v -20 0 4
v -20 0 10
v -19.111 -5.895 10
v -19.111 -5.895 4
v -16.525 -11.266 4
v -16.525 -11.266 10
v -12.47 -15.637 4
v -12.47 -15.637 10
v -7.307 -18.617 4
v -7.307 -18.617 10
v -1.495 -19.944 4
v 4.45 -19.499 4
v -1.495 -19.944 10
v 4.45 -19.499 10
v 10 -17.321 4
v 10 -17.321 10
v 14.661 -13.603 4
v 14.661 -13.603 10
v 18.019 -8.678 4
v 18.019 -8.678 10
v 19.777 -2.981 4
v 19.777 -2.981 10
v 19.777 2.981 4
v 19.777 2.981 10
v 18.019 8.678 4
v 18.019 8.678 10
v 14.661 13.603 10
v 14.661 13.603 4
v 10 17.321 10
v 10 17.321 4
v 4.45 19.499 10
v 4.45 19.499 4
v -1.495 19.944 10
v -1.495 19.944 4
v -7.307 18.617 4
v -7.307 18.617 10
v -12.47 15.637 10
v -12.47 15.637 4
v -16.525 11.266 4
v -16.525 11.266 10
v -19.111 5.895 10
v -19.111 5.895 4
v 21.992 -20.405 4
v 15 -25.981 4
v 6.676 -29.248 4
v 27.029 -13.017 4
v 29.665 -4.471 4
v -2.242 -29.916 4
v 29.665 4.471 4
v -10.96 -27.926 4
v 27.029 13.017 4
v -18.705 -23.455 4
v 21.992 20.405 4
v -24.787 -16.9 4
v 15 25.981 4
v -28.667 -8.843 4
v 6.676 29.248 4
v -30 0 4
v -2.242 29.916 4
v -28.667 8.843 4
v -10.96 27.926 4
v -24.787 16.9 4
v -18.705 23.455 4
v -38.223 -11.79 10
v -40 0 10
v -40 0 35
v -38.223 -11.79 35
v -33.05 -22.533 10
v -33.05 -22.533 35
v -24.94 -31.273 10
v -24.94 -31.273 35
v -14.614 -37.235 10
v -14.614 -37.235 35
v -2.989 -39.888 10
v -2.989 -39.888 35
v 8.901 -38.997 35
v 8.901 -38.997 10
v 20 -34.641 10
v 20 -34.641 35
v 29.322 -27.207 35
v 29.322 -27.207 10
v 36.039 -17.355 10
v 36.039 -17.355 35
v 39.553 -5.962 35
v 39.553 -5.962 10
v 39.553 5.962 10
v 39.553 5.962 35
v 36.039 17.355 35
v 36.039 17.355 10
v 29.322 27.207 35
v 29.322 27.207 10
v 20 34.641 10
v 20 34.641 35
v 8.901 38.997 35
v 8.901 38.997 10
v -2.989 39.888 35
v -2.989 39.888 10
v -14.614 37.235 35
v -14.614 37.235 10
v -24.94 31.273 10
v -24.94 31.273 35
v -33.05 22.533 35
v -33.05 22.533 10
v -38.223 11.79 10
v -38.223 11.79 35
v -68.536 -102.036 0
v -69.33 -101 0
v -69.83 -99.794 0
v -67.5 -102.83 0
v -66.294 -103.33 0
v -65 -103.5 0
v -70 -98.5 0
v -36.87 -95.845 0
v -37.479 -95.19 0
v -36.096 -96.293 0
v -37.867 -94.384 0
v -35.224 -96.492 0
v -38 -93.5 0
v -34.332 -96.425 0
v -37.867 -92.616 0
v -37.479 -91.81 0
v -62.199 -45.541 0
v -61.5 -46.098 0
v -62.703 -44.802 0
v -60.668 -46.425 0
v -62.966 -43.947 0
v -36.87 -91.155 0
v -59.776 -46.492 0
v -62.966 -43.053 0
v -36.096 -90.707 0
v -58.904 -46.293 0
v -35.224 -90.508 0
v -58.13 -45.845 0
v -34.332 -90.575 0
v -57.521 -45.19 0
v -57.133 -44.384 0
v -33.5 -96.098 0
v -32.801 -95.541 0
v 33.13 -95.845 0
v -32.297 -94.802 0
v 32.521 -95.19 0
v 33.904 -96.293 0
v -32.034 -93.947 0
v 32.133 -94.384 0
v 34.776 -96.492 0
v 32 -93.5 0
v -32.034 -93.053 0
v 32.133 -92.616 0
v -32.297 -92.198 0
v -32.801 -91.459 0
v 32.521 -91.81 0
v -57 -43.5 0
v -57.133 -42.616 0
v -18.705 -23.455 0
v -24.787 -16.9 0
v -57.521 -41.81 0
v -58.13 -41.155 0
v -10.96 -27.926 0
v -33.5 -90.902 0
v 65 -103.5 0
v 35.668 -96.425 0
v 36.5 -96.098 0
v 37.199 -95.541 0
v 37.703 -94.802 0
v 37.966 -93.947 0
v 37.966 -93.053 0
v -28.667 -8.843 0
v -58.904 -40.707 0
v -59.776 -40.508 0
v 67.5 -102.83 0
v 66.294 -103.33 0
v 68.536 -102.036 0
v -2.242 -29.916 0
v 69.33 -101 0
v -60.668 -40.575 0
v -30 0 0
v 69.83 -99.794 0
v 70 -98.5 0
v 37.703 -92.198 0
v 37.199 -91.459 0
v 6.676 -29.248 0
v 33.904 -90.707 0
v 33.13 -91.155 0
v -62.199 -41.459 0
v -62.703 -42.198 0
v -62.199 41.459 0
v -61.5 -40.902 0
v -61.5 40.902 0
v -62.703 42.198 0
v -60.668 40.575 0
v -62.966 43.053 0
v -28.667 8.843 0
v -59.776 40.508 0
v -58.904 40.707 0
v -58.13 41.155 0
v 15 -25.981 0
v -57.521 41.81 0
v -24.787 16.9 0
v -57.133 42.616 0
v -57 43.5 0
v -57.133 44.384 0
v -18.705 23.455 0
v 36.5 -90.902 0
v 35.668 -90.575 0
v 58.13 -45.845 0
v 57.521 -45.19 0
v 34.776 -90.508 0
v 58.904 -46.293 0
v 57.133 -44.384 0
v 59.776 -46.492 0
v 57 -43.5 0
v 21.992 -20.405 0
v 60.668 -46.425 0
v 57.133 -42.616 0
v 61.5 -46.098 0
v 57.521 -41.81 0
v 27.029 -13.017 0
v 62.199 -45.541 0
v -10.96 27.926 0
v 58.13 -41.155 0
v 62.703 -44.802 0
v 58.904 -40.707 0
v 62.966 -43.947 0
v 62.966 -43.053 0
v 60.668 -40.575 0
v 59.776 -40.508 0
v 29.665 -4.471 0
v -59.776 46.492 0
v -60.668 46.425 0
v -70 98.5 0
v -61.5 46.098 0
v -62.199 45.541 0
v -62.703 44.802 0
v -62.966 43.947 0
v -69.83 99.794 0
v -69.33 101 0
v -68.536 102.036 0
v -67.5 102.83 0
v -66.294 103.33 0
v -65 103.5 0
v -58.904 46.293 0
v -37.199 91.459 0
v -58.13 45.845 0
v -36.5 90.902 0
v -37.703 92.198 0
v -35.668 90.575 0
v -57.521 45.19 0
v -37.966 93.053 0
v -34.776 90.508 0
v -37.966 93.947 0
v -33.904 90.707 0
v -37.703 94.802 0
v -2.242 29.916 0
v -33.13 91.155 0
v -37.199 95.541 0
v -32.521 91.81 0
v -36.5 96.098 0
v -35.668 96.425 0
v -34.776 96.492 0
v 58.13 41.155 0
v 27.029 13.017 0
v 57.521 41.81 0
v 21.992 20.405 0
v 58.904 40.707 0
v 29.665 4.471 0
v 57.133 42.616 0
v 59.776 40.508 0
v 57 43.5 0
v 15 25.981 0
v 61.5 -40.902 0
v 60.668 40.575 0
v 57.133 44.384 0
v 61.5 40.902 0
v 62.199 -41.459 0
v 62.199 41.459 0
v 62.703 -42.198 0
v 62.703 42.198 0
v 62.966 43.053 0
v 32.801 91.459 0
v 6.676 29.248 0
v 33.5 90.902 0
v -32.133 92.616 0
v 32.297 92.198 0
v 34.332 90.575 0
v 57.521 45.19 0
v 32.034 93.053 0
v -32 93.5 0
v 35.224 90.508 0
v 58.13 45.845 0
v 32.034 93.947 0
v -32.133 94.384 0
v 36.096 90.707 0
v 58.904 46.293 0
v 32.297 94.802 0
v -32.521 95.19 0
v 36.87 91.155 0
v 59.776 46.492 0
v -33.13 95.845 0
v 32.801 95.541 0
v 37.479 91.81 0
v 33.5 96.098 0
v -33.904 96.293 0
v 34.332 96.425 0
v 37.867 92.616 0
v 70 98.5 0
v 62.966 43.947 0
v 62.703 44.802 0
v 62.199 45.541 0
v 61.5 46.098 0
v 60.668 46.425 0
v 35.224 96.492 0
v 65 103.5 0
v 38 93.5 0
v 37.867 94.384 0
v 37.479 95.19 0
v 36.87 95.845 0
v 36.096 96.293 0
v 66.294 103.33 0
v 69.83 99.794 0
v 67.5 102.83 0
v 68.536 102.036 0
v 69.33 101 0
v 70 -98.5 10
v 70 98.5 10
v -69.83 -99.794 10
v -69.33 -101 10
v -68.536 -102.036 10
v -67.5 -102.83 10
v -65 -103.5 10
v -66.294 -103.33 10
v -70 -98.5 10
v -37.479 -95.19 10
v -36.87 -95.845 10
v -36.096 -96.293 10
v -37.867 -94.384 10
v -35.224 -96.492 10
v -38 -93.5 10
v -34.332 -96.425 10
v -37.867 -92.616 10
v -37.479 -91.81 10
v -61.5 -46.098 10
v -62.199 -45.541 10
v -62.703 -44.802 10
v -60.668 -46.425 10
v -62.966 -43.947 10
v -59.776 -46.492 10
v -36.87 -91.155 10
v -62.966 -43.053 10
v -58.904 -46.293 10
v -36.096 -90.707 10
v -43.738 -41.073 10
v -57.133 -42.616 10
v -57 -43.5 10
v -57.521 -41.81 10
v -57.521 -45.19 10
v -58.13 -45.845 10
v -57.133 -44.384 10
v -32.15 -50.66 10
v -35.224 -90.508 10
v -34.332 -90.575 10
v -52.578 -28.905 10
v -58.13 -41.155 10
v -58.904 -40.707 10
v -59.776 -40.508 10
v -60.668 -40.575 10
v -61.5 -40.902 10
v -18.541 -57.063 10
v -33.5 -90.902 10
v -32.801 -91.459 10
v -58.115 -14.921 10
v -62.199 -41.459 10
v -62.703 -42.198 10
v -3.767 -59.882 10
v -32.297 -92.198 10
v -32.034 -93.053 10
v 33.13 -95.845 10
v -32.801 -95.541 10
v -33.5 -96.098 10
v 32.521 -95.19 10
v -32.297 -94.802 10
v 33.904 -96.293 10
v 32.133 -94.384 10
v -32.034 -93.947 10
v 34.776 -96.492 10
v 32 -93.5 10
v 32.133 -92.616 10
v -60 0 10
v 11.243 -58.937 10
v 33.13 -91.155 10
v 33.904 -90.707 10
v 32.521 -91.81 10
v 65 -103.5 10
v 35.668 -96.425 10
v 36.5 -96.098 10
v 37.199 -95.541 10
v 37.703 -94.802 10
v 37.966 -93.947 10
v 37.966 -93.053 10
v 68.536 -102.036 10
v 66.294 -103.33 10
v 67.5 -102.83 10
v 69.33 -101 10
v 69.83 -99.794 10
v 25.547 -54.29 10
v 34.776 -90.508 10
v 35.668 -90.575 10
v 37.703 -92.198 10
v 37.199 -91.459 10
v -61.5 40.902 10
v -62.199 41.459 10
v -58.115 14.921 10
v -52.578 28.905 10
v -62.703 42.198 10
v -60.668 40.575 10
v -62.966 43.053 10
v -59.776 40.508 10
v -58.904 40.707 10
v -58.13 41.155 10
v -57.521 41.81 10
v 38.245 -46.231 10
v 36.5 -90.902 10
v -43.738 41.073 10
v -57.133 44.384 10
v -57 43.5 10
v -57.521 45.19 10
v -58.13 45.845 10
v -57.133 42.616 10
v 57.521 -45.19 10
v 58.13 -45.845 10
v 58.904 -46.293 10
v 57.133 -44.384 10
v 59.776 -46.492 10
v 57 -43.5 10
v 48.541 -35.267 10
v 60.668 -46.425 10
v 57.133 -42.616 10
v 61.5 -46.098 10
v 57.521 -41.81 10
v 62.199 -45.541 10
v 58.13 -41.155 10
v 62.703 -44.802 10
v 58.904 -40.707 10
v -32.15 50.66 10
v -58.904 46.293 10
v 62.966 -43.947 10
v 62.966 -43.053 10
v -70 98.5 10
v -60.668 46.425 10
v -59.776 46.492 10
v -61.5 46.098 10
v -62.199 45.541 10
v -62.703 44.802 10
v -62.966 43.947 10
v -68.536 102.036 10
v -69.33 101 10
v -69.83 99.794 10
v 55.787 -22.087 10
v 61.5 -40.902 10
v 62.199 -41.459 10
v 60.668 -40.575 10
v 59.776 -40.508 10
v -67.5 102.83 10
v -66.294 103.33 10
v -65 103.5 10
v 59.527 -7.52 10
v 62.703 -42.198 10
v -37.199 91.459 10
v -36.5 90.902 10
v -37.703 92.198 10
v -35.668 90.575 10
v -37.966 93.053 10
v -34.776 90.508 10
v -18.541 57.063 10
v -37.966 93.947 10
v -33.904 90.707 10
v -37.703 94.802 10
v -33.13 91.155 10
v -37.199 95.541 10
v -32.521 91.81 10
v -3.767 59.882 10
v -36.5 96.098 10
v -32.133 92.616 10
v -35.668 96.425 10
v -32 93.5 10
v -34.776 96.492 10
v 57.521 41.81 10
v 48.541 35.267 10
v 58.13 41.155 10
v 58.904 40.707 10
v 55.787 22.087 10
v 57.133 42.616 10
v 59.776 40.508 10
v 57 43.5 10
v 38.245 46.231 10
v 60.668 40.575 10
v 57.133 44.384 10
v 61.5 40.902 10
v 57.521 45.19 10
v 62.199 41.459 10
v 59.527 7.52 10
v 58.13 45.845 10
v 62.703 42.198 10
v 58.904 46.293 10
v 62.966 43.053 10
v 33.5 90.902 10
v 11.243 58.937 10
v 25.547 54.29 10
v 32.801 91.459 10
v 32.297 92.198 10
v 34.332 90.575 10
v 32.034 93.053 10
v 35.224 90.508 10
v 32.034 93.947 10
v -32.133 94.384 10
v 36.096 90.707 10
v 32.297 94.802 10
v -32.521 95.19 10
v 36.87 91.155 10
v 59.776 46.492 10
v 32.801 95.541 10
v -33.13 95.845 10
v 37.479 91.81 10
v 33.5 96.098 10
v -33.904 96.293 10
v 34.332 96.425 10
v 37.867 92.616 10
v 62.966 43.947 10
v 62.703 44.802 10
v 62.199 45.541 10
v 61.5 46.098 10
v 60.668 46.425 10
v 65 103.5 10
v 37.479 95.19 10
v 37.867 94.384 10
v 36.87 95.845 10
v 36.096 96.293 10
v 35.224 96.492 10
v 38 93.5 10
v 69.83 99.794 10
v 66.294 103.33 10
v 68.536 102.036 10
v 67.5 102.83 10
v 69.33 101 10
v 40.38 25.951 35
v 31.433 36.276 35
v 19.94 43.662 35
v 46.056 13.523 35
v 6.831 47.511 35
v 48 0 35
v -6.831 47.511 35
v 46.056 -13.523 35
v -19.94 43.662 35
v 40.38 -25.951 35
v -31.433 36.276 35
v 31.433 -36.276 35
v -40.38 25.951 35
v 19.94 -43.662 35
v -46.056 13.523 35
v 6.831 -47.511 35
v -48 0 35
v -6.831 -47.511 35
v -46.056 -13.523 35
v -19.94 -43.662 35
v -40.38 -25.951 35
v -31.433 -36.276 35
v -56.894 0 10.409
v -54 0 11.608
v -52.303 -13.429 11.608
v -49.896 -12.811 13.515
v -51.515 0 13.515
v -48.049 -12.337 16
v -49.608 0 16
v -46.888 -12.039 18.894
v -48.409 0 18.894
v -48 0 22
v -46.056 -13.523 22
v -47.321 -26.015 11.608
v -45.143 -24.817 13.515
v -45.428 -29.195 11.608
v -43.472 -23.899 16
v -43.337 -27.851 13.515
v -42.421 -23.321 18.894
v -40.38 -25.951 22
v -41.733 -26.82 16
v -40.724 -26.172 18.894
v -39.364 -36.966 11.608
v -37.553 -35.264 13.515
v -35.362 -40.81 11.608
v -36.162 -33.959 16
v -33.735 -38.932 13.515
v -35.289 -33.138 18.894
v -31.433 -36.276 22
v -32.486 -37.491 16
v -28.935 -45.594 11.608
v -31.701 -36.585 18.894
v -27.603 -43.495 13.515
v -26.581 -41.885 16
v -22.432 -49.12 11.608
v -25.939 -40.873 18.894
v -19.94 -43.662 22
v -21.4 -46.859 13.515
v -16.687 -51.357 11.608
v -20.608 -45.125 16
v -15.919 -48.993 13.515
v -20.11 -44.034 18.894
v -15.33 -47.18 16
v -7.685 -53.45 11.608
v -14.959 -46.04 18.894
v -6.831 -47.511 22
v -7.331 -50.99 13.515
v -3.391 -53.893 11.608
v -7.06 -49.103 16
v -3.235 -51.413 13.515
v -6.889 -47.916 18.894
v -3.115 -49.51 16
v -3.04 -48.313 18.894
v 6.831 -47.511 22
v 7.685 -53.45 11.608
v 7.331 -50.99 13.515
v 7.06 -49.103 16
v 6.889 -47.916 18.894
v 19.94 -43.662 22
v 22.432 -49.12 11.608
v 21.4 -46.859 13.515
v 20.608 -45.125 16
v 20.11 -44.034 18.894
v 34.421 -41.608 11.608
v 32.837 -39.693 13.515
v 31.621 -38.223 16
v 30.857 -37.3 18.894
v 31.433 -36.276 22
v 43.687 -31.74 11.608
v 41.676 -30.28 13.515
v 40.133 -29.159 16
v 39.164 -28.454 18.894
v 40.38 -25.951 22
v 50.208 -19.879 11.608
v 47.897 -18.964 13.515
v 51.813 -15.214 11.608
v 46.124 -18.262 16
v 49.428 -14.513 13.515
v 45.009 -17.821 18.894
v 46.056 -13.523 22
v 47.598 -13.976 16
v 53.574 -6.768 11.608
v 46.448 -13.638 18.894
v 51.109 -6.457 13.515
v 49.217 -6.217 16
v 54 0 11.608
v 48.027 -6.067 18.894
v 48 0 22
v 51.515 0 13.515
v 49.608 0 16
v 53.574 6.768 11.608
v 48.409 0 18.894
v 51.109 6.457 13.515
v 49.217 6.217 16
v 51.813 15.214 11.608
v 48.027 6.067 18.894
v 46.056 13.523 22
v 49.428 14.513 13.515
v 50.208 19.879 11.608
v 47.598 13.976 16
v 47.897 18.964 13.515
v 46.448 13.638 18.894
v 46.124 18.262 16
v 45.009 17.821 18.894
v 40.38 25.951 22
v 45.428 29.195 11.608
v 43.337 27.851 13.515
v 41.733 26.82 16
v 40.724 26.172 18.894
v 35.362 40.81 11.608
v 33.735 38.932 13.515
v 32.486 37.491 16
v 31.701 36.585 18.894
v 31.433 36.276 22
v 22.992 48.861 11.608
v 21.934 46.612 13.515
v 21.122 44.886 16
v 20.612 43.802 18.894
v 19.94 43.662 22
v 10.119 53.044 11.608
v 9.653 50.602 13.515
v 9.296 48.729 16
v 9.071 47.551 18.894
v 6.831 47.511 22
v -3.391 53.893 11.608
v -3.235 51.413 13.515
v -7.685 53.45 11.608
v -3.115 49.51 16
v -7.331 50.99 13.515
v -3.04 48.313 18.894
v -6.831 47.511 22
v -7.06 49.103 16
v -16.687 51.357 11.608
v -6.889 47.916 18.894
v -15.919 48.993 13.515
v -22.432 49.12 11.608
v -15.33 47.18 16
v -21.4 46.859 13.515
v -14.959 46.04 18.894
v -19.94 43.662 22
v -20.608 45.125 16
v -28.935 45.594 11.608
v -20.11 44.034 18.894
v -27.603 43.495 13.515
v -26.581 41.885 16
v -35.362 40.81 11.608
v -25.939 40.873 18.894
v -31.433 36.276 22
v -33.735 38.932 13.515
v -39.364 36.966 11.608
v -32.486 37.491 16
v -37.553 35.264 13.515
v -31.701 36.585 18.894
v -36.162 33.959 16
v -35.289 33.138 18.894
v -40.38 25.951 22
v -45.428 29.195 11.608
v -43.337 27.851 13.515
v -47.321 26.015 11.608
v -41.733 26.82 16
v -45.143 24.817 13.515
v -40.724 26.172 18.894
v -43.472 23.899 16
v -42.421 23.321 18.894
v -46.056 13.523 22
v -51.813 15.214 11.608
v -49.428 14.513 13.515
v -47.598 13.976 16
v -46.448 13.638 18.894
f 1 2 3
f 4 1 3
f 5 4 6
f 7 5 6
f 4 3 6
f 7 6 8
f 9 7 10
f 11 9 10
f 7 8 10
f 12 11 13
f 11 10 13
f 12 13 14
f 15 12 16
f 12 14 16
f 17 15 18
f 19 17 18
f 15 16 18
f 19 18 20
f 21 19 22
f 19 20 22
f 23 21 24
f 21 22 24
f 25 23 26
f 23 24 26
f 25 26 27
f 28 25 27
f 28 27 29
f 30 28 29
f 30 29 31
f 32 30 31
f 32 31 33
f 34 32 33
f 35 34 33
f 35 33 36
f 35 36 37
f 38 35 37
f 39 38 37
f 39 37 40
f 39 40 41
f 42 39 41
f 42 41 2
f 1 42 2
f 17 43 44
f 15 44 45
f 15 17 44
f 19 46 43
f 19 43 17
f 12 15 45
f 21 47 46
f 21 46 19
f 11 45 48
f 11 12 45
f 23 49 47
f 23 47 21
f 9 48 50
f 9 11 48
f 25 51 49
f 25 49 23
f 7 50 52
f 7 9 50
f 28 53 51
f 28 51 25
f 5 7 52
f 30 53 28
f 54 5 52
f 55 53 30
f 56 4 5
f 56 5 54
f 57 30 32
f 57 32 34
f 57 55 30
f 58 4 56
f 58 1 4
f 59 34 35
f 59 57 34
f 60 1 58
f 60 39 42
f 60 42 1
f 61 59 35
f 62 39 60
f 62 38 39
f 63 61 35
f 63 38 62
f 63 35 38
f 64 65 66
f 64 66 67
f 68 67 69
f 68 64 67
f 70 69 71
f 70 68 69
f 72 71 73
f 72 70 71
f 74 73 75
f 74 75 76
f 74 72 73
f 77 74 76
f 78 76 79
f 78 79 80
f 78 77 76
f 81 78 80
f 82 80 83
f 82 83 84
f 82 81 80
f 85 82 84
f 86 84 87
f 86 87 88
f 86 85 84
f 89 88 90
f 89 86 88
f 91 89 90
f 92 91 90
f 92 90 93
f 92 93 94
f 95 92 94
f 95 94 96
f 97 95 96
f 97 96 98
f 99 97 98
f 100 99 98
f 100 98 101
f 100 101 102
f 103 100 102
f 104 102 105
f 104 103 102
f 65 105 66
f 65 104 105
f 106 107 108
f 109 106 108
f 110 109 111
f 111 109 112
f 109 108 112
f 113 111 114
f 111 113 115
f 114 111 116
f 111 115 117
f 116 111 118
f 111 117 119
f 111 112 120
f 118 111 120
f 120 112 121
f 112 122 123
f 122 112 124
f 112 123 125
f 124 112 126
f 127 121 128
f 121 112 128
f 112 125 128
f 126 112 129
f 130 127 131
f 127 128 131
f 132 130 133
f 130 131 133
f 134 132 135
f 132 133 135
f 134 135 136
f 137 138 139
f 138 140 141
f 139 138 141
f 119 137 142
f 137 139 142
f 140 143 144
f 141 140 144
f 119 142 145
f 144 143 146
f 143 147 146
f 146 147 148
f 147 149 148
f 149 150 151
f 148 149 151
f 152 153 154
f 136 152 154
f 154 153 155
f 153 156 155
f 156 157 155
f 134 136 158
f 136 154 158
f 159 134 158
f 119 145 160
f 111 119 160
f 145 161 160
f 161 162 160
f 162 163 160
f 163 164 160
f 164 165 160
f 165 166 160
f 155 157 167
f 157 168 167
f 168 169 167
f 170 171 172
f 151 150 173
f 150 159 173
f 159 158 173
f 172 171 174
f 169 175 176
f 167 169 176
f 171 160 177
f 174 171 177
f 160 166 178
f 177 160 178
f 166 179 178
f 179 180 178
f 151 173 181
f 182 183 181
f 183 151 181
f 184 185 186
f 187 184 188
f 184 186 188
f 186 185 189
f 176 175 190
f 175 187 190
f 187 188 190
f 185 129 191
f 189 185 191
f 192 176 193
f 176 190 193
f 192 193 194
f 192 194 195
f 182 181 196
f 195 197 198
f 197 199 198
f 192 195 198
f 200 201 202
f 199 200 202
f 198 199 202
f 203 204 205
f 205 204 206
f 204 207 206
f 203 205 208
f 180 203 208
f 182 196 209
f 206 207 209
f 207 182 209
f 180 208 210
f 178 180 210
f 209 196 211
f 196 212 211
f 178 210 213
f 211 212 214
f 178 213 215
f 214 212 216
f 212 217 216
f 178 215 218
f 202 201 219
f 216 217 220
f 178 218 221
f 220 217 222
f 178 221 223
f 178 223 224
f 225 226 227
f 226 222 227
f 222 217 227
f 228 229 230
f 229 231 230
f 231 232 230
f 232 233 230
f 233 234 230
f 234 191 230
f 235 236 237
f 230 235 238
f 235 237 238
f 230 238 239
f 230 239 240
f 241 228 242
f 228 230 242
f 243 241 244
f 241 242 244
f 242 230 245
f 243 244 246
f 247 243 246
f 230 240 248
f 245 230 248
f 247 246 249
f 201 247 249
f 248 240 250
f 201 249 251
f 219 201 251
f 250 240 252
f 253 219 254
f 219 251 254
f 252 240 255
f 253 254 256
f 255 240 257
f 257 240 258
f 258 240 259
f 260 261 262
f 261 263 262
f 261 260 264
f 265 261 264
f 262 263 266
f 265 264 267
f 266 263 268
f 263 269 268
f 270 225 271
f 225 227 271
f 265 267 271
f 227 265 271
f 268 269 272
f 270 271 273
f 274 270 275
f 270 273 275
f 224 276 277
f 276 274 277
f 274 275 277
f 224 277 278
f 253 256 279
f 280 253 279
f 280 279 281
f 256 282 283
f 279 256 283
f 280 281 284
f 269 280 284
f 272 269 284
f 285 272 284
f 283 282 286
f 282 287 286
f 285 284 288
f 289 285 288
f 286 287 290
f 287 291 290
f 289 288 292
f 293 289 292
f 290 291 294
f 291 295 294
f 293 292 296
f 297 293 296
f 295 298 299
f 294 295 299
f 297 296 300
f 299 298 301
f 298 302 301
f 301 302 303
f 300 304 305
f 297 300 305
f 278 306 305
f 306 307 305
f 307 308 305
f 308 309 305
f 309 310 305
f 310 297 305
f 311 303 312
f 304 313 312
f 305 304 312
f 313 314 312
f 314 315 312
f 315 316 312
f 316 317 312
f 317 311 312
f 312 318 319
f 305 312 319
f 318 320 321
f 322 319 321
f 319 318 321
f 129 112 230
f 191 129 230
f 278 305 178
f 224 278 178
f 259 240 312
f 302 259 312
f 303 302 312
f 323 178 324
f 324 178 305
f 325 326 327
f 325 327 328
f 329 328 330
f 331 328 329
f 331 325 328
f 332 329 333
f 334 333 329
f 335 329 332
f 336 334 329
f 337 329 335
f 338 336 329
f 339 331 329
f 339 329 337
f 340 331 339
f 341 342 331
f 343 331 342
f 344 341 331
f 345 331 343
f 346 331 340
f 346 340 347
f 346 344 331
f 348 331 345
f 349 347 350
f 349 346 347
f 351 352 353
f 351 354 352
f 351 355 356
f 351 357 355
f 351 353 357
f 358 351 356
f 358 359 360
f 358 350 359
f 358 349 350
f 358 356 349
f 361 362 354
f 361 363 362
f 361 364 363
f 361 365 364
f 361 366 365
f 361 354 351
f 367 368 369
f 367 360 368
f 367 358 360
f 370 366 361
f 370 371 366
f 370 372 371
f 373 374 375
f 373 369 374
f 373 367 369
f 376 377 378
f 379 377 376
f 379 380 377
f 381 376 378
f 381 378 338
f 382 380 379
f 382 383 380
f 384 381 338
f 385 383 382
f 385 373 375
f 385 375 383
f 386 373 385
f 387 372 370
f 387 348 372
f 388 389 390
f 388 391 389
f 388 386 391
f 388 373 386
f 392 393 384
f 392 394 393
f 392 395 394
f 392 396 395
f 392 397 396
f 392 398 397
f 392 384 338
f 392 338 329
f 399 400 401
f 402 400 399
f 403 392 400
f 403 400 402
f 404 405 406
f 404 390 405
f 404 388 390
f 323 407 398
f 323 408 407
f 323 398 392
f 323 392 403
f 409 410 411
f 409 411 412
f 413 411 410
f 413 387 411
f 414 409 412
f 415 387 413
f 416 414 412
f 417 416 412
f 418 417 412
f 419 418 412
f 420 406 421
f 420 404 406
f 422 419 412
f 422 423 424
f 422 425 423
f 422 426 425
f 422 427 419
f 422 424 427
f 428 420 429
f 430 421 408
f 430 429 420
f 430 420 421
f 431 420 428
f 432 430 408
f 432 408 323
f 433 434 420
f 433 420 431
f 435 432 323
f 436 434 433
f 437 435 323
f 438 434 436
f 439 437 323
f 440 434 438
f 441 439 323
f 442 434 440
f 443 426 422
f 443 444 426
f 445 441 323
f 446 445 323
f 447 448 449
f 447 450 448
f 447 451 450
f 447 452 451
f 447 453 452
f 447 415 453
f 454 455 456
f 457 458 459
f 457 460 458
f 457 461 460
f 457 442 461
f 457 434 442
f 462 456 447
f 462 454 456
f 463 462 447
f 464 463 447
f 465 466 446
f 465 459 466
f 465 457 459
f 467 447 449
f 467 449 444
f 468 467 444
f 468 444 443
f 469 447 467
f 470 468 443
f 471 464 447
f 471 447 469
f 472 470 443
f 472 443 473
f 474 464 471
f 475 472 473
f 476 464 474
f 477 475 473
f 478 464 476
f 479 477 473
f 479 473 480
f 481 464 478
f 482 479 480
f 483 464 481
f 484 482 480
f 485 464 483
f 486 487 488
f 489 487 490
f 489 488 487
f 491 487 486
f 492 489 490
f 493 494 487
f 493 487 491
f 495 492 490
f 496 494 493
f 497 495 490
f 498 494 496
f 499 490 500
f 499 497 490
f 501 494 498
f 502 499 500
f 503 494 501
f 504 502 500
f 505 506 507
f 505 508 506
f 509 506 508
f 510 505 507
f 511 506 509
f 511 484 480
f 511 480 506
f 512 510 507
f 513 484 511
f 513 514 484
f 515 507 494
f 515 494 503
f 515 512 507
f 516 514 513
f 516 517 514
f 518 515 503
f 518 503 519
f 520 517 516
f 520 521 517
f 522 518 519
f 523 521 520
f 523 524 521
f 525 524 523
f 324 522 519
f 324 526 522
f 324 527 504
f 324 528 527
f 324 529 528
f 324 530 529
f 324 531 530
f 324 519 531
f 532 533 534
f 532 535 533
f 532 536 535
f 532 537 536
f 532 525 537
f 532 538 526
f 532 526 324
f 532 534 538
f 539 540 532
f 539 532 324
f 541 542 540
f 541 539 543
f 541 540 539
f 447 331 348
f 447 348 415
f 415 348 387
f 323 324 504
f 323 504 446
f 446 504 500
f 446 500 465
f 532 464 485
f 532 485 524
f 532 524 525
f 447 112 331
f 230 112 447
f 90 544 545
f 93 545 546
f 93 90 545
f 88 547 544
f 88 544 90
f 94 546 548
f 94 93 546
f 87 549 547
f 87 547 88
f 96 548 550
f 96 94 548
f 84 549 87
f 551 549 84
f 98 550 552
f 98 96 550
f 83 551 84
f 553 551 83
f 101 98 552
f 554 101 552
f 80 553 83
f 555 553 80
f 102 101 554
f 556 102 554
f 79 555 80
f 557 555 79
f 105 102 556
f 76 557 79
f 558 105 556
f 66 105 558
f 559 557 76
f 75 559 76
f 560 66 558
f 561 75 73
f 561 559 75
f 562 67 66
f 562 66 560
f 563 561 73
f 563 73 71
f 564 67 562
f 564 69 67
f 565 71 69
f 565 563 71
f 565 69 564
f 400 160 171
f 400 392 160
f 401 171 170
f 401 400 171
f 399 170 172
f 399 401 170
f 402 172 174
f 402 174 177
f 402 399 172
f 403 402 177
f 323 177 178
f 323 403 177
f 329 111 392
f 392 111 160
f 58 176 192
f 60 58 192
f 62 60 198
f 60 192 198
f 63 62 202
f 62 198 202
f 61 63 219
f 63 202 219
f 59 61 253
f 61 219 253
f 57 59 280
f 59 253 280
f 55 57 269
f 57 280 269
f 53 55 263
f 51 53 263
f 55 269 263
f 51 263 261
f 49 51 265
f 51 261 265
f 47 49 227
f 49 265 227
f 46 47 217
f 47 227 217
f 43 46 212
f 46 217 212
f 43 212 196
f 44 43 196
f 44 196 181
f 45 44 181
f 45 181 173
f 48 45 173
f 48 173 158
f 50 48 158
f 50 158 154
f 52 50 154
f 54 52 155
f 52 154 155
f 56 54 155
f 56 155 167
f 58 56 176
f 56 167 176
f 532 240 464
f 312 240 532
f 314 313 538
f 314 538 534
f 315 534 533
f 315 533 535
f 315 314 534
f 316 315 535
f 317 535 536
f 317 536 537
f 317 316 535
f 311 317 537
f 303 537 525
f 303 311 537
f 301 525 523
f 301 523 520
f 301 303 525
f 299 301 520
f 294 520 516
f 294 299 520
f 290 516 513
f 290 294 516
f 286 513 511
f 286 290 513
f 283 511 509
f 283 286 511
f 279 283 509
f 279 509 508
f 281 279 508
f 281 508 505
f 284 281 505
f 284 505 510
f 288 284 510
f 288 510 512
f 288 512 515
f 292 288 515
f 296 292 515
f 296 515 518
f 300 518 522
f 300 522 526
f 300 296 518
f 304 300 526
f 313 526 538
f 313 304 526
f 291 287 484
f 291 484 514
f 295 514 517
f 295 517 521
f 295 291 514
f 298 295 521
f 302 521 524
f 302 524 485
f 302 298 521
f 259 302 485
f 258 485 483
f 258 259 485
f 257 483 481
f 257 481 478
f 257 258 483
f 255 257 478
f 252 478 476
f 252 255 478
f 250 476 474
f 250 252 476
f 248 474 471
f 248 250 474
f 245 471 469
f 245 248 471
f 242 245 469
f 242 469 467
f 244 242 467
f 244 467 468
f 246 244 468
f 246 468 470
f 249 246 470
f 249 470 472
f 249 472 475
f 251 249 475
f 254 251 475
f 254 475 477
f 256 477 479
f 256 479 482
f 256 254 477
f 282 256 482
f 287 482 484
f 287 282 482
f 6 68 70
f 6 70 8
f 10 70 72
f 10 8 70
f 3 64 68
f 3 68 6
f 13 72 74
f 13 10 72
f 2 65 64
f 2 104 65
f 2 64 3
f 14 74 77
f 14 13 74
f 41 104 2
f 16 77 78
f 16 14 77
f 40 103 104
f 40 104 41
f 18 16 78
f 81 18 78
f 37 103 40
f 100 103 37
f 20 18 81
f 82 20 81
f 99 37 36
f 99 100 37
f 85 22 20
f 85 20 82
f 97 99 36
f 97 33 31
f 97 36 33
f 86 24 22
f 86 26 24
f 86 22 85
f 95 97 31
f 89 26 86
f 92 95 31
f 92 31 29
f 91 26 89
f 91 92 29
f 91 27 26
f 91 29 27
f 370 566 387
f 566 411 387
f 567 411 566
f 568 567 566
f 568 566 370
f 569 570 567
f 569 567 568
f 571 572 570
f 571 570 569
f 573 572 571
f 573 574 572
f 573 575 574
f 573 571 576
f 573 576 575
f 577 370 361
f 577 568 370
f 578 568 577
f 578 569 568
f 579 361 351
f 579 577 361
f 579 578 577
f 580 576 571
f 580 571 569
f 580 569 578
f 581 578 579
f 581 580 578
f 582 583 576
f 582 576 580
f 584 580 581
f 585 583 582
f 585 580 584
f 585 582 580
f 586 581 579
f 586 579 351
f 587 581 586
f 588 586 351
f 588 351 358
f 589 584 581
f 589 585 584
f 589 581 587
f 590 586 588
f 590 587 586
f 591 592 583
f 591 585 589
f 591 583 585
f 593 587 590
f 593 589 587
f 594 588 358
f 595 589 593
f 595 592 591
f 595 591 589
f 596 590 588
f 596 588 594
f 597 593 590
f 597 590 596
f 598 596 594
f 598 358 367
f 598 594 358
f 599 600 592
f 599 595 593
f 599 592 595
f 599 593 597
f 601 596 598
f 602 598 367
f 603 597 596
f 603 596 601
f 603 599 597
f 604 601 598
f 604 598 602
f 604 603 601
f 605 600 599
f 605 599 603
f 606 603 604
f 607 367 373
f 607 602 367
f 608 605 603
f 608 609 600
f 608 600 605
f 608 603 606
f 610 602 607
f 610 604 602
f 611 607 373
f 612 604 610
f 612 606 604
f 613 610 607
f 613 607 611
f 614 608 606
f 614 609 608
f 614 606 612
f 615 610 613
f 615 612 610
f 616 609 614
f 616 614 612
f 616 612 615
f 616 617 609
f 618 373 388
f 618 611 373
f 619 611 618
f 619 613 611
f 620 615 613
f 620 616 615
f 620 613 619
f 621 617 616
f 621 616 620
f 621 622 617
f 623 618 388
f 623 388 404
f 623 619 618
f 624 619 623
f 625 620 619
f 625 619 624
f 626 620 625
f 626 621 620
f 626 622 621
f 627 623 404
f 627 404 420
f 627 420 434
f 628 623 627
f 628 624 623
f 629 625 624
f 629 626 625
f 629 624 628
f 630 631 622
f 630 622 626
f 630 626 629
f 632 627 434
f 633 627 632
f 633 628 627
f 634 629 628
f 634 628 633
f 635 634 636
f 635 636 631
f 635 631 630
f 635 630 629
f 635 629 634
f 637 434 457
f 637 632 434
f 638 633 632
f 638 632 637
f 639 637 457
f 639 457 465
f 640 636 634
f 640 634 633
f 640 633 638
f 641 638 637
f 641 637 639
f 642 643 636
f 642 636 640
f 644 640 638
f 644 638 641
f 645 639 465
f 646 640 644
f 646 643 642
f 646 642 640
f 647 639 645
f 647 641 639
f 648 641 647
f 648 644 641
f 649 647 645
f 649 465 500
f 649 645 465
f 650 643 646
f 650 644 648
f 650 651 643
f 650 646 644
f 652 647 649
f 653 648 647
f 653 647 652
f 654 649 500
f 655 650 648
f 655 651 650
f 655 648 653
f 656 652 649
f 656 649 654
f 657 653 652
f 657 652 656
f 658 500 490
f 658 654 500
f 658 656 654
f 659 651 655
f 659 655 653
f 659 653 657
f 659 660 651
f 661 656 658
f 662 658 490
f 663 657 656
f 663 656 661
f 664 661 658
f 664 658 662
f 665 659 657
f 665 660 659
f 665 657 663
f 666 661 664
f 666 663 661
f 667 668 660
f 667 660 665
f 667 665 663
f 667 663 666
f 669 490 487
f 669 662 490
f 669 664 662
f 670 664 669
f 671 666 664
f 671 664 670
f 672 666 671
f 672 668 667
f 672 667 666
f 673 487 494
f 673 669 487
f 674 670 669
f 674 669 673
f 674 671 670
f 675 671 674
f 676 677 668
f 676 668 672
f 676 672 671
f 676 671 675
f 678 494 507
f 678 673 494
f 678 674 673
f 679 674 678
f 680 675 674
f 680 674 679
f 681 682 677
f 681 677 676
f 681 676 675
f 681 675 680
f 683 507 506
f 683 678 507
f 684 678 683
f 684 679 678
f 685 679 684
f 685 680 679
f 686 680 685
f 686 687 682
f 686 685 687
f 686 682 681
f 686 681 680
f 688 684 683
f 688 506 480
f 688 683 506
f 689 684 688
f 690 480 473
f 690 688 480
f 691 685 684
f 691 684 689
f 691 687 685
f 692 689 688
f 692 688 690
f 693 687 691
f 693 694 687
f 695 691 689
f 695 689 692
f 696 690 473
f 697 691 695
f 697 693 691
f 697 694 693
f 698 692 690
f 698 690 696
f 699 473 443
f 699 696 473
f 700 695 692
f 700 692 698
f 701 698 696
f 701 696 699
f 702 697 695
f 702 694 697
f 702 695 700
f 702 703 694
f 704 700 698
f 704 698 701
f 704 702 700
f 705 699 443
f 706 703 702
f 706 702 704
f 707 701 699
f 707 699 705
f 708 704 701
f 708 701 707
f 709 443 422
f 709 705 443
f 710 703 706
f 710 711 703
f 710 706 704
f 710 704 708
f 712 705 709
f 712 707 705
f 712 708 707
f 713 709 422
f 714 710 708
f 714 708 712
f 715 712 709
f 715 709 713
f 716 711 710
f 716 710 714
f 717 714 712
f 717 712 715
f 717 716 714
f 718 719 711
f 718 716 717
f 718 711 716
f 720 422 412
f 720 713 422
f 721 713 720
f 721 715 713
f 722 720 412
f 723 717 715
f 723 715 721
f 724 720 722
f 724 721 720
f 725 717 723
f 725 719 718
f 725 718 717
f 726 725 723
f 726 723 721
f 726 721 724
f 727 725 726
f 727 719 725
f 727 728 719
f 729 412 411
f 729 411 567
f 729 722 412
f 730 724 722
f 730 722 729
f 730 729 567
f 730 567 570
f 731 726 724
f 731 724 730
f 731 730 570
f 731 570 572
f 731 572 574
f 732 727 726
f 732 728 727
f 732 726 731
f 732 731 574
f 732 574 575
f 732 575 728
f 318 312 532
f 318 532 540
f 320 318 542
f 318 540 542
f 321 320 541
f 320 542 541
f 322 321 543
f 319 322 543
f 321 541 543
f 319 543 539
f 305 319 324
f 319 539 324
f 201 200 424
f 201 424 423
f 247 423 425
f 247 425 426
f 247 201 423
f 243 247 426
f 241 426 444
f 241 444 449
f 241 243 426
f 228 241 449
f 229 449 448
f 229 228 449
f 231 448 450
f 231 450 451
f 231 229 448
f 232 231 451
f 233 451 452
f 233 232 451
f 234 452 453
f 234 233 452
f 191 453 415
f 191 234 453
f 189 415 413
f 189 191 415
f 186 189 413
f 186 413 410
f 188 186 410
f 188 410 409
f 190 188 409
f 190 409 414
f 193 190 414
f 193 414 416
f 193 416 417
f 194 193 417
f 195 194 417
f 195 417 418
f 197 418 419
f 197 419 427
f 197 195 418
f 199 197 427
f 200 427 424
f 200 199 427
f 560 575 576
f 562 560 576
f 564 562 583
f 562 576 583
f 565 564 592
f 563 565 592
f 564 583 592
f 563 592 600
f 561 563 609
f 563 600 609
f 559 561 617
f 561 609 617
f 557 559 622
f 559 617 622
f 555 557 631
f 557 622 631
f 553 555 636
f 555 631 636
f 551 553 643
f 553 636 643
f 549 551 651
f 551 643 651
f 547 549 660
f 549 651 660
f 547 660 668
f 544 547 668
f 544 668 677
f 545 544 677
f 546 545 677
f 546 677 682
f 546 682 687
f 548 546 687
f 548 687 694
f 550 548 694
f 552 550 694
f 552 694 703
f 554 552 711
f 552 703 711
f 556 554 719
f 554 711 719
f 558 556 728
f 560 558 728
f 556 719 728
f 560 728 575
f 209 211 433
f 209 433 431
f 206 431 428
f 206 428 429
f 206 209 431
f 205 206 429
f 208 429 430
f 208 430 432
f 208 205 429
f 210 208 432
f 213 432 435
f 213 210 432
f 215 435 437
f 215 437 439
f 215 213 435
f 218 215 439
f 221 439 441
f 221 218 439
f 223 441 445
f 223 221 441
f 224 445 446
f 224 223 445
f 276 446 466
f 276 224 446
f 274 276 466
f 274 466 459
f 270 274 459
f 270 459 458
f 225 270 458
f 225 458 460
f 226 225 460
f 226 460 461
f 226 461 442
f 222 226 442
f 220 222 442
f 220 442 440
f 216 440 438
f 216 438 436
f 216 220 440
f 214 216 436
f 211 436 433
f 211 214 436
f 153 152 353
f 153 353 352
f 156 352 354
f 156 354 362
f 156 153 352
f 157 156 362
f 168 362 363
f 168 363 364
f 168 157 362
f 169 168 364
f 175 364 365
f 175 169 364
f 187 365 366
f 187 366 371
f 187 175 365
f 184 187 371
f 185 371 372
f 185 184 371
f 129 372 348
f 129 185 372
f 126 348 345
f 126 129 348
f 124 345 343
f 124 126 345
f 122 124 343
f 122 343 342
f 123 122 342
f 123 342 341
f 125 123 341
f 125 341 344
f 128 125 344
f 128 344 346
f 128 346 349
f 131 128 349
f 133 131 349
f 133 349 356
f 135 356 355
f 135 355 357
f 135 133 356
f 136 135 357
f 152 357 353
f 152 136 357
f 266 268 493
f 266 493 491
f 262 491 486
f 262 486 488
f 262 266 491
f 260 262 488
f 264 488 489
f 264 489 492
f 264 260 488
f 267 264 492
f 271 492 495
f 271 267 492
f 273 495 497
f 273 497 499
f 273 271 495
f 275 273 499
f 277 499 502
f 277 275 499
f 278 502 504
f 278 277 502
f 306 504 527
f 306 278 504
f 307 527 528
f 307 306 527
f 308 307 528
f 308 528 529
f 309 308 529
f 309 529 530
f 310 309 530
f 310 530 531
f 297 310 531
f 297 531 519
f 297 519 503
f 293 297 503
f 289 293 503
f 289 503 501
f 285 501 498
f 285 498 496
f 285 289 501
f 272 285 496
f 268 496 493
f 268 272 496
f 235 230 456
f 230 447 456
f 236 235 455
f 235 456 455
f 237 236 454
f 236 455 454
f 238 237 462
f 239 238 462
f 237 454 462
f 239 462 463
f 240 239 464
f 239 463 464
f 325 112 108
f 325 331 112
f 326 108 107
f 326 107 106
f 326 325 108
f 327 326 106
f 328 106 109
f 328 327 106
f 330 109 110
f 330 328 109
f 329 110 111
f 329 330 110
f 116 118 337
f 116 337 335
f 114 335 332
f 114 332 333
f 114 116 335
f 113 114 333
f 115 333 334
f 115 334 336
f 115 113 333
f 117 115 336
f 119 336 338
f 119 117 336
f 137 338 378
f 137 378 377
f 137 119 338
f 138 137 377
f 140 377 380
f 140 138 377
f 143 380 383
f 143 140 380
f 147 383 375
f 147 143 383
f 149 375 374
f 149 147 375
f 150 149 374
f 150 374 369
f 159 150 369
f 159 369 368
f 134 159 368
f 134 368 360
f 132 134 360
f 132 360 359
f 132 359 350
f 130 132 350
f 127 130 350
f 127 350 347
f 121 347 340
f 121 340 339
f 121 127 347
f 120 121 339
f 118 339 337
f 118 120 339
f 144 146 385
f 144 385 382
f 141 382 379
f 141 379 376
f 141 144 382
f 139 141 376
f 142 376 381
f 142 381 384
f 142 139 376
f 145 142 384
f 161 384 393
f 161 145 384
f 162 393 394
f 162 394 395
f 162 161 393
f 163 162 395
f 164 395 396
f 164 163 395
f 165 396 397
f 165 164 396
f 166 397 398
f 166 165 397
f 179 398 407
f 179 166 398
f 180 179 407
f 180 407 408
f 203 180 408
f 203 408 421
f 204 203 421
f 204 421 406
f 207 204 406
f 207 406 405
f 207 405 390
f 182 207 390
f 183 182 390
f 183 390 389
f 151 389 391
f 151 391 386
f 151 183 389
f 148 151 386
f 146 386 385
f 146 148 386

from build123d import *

# Parameters (mm, degrees)
SKETCH1_W           = 140
SKETCH1_H           = 207
SKETCH1_R           = 3
BOSS_EXTRUDE1_DEPTH = 10
SKETCH2_R           = 48
SKETCH2_R_2         = 40
BOSS_EXTRUDE2_DEPTH = 25
SKETCH3_R           = 20
CUT_EXTRUDE1_DEPTH  = 25
FILLET1_R           = 5
SKETCH4_R           = 30
CUT_EXTRUDE2_DEPTH  = 4
FILLET2_R           = 12


with BuildPart() as part:
    # Sketch1 → Boss-Extrude1 (new body)
    with BuildSketch(Plane.XY):
        Rectangle(SKETCH1_W, SKETCH1_H)
        with Locations((-35, 93.5)):
            Circle(SKETCH1_R, mode=Mode.SUBTRACT)
        with Locations((35, 93.5)):
            Circle(SKETCH1_R, mode=Mode.SUBTRACT)
        with Locations(Location((35, -93.5, 0), (0, 0, 180))):
            Circle(SKETCH1_R, mode=Mode.SUBTRACT)
        with Locations(Location((-35, -93.5, 0), (0, 0, 180))):
            Circle(SKETCH1_R, mode=Mode.SUBTRACT)
        with Locations((-60, -43.5)):
            Circle(SKETCH1_R, mode=Mode.SUBTRACT)
        with Locations((-60, 43.5)):
            Circle(SKETCH1_R, mode=Mode.SUBTRACT)
        with Locations(Location((60, 43.5, 0), (0, 0, 180))):
            Circle(SKETCH1_R, mode=Mode.SUBTRACT)
        with Locations(Location((60, -43.5, 0), (0, 0, 180))):
            Circle(SKETCH1_R, mode=Mode.SUBTRACT)
    extrude(amount=BOSS_EXTRUDE1_DEPTH)

    # Sketch2 → Boss-Extrude2 (add)
    with BuildSketch(Plane.XY.offset(10)):
        with Locations(Location((0, 0, 0), (0, 0, 180))):
            Circle(SKETCH2_R)
        with Locations(Location((0, 0, 0), (0, 0, 180))):
            Circle(SKETCH2_R_2, mode=Mode.SUBTRACT)
    extrude(amount=BOSS_EXTRUDE2_DEPTH)

    # Sketch3 → Cut-Extrude1 (cut)
    with BuildSketch(Plane.XY.offset(10)):
        with Locations(Location((0, 0, 0), (0, 0, 180))):
            Circle(SKETCH3_R)
    extrude(amount=-CUT_EXTRUDE1_DEPTH, mode=Mode.SUBTRACT)

    # Fillet1
    fillet1_edges = [part.edges().sort_by_distance(p)[0] for p in [
        (70, -103.5, 5),
        (-70, -103.5, 5),
        (-70, 103.5, 5),
        (70, 103.5, 5),
    ]]
    fillet(fillet1_edges, radius=FILLET1_R)

    # Sketch4 → Cut-Extrude2 (cut)
    with BuildSketch(Plane(origin=(0, 0, 0), x_dir=(-1, 0, 0), z_dir=(0, 0, -1))):
        Circle(SKETCH4_R)
    extrude(amount=-CUT_EXTRUDE2_DEPTH, mode=Mode.SUBTRACT)

    # Fillet2
    fillet2_edges = [part.edges().sort_by_distance(p)[0] for p in [
        (48, 0, 10),
    ]]
    fillet(fillet2_edges, radius=FILLET2_R)


solid = part.part
